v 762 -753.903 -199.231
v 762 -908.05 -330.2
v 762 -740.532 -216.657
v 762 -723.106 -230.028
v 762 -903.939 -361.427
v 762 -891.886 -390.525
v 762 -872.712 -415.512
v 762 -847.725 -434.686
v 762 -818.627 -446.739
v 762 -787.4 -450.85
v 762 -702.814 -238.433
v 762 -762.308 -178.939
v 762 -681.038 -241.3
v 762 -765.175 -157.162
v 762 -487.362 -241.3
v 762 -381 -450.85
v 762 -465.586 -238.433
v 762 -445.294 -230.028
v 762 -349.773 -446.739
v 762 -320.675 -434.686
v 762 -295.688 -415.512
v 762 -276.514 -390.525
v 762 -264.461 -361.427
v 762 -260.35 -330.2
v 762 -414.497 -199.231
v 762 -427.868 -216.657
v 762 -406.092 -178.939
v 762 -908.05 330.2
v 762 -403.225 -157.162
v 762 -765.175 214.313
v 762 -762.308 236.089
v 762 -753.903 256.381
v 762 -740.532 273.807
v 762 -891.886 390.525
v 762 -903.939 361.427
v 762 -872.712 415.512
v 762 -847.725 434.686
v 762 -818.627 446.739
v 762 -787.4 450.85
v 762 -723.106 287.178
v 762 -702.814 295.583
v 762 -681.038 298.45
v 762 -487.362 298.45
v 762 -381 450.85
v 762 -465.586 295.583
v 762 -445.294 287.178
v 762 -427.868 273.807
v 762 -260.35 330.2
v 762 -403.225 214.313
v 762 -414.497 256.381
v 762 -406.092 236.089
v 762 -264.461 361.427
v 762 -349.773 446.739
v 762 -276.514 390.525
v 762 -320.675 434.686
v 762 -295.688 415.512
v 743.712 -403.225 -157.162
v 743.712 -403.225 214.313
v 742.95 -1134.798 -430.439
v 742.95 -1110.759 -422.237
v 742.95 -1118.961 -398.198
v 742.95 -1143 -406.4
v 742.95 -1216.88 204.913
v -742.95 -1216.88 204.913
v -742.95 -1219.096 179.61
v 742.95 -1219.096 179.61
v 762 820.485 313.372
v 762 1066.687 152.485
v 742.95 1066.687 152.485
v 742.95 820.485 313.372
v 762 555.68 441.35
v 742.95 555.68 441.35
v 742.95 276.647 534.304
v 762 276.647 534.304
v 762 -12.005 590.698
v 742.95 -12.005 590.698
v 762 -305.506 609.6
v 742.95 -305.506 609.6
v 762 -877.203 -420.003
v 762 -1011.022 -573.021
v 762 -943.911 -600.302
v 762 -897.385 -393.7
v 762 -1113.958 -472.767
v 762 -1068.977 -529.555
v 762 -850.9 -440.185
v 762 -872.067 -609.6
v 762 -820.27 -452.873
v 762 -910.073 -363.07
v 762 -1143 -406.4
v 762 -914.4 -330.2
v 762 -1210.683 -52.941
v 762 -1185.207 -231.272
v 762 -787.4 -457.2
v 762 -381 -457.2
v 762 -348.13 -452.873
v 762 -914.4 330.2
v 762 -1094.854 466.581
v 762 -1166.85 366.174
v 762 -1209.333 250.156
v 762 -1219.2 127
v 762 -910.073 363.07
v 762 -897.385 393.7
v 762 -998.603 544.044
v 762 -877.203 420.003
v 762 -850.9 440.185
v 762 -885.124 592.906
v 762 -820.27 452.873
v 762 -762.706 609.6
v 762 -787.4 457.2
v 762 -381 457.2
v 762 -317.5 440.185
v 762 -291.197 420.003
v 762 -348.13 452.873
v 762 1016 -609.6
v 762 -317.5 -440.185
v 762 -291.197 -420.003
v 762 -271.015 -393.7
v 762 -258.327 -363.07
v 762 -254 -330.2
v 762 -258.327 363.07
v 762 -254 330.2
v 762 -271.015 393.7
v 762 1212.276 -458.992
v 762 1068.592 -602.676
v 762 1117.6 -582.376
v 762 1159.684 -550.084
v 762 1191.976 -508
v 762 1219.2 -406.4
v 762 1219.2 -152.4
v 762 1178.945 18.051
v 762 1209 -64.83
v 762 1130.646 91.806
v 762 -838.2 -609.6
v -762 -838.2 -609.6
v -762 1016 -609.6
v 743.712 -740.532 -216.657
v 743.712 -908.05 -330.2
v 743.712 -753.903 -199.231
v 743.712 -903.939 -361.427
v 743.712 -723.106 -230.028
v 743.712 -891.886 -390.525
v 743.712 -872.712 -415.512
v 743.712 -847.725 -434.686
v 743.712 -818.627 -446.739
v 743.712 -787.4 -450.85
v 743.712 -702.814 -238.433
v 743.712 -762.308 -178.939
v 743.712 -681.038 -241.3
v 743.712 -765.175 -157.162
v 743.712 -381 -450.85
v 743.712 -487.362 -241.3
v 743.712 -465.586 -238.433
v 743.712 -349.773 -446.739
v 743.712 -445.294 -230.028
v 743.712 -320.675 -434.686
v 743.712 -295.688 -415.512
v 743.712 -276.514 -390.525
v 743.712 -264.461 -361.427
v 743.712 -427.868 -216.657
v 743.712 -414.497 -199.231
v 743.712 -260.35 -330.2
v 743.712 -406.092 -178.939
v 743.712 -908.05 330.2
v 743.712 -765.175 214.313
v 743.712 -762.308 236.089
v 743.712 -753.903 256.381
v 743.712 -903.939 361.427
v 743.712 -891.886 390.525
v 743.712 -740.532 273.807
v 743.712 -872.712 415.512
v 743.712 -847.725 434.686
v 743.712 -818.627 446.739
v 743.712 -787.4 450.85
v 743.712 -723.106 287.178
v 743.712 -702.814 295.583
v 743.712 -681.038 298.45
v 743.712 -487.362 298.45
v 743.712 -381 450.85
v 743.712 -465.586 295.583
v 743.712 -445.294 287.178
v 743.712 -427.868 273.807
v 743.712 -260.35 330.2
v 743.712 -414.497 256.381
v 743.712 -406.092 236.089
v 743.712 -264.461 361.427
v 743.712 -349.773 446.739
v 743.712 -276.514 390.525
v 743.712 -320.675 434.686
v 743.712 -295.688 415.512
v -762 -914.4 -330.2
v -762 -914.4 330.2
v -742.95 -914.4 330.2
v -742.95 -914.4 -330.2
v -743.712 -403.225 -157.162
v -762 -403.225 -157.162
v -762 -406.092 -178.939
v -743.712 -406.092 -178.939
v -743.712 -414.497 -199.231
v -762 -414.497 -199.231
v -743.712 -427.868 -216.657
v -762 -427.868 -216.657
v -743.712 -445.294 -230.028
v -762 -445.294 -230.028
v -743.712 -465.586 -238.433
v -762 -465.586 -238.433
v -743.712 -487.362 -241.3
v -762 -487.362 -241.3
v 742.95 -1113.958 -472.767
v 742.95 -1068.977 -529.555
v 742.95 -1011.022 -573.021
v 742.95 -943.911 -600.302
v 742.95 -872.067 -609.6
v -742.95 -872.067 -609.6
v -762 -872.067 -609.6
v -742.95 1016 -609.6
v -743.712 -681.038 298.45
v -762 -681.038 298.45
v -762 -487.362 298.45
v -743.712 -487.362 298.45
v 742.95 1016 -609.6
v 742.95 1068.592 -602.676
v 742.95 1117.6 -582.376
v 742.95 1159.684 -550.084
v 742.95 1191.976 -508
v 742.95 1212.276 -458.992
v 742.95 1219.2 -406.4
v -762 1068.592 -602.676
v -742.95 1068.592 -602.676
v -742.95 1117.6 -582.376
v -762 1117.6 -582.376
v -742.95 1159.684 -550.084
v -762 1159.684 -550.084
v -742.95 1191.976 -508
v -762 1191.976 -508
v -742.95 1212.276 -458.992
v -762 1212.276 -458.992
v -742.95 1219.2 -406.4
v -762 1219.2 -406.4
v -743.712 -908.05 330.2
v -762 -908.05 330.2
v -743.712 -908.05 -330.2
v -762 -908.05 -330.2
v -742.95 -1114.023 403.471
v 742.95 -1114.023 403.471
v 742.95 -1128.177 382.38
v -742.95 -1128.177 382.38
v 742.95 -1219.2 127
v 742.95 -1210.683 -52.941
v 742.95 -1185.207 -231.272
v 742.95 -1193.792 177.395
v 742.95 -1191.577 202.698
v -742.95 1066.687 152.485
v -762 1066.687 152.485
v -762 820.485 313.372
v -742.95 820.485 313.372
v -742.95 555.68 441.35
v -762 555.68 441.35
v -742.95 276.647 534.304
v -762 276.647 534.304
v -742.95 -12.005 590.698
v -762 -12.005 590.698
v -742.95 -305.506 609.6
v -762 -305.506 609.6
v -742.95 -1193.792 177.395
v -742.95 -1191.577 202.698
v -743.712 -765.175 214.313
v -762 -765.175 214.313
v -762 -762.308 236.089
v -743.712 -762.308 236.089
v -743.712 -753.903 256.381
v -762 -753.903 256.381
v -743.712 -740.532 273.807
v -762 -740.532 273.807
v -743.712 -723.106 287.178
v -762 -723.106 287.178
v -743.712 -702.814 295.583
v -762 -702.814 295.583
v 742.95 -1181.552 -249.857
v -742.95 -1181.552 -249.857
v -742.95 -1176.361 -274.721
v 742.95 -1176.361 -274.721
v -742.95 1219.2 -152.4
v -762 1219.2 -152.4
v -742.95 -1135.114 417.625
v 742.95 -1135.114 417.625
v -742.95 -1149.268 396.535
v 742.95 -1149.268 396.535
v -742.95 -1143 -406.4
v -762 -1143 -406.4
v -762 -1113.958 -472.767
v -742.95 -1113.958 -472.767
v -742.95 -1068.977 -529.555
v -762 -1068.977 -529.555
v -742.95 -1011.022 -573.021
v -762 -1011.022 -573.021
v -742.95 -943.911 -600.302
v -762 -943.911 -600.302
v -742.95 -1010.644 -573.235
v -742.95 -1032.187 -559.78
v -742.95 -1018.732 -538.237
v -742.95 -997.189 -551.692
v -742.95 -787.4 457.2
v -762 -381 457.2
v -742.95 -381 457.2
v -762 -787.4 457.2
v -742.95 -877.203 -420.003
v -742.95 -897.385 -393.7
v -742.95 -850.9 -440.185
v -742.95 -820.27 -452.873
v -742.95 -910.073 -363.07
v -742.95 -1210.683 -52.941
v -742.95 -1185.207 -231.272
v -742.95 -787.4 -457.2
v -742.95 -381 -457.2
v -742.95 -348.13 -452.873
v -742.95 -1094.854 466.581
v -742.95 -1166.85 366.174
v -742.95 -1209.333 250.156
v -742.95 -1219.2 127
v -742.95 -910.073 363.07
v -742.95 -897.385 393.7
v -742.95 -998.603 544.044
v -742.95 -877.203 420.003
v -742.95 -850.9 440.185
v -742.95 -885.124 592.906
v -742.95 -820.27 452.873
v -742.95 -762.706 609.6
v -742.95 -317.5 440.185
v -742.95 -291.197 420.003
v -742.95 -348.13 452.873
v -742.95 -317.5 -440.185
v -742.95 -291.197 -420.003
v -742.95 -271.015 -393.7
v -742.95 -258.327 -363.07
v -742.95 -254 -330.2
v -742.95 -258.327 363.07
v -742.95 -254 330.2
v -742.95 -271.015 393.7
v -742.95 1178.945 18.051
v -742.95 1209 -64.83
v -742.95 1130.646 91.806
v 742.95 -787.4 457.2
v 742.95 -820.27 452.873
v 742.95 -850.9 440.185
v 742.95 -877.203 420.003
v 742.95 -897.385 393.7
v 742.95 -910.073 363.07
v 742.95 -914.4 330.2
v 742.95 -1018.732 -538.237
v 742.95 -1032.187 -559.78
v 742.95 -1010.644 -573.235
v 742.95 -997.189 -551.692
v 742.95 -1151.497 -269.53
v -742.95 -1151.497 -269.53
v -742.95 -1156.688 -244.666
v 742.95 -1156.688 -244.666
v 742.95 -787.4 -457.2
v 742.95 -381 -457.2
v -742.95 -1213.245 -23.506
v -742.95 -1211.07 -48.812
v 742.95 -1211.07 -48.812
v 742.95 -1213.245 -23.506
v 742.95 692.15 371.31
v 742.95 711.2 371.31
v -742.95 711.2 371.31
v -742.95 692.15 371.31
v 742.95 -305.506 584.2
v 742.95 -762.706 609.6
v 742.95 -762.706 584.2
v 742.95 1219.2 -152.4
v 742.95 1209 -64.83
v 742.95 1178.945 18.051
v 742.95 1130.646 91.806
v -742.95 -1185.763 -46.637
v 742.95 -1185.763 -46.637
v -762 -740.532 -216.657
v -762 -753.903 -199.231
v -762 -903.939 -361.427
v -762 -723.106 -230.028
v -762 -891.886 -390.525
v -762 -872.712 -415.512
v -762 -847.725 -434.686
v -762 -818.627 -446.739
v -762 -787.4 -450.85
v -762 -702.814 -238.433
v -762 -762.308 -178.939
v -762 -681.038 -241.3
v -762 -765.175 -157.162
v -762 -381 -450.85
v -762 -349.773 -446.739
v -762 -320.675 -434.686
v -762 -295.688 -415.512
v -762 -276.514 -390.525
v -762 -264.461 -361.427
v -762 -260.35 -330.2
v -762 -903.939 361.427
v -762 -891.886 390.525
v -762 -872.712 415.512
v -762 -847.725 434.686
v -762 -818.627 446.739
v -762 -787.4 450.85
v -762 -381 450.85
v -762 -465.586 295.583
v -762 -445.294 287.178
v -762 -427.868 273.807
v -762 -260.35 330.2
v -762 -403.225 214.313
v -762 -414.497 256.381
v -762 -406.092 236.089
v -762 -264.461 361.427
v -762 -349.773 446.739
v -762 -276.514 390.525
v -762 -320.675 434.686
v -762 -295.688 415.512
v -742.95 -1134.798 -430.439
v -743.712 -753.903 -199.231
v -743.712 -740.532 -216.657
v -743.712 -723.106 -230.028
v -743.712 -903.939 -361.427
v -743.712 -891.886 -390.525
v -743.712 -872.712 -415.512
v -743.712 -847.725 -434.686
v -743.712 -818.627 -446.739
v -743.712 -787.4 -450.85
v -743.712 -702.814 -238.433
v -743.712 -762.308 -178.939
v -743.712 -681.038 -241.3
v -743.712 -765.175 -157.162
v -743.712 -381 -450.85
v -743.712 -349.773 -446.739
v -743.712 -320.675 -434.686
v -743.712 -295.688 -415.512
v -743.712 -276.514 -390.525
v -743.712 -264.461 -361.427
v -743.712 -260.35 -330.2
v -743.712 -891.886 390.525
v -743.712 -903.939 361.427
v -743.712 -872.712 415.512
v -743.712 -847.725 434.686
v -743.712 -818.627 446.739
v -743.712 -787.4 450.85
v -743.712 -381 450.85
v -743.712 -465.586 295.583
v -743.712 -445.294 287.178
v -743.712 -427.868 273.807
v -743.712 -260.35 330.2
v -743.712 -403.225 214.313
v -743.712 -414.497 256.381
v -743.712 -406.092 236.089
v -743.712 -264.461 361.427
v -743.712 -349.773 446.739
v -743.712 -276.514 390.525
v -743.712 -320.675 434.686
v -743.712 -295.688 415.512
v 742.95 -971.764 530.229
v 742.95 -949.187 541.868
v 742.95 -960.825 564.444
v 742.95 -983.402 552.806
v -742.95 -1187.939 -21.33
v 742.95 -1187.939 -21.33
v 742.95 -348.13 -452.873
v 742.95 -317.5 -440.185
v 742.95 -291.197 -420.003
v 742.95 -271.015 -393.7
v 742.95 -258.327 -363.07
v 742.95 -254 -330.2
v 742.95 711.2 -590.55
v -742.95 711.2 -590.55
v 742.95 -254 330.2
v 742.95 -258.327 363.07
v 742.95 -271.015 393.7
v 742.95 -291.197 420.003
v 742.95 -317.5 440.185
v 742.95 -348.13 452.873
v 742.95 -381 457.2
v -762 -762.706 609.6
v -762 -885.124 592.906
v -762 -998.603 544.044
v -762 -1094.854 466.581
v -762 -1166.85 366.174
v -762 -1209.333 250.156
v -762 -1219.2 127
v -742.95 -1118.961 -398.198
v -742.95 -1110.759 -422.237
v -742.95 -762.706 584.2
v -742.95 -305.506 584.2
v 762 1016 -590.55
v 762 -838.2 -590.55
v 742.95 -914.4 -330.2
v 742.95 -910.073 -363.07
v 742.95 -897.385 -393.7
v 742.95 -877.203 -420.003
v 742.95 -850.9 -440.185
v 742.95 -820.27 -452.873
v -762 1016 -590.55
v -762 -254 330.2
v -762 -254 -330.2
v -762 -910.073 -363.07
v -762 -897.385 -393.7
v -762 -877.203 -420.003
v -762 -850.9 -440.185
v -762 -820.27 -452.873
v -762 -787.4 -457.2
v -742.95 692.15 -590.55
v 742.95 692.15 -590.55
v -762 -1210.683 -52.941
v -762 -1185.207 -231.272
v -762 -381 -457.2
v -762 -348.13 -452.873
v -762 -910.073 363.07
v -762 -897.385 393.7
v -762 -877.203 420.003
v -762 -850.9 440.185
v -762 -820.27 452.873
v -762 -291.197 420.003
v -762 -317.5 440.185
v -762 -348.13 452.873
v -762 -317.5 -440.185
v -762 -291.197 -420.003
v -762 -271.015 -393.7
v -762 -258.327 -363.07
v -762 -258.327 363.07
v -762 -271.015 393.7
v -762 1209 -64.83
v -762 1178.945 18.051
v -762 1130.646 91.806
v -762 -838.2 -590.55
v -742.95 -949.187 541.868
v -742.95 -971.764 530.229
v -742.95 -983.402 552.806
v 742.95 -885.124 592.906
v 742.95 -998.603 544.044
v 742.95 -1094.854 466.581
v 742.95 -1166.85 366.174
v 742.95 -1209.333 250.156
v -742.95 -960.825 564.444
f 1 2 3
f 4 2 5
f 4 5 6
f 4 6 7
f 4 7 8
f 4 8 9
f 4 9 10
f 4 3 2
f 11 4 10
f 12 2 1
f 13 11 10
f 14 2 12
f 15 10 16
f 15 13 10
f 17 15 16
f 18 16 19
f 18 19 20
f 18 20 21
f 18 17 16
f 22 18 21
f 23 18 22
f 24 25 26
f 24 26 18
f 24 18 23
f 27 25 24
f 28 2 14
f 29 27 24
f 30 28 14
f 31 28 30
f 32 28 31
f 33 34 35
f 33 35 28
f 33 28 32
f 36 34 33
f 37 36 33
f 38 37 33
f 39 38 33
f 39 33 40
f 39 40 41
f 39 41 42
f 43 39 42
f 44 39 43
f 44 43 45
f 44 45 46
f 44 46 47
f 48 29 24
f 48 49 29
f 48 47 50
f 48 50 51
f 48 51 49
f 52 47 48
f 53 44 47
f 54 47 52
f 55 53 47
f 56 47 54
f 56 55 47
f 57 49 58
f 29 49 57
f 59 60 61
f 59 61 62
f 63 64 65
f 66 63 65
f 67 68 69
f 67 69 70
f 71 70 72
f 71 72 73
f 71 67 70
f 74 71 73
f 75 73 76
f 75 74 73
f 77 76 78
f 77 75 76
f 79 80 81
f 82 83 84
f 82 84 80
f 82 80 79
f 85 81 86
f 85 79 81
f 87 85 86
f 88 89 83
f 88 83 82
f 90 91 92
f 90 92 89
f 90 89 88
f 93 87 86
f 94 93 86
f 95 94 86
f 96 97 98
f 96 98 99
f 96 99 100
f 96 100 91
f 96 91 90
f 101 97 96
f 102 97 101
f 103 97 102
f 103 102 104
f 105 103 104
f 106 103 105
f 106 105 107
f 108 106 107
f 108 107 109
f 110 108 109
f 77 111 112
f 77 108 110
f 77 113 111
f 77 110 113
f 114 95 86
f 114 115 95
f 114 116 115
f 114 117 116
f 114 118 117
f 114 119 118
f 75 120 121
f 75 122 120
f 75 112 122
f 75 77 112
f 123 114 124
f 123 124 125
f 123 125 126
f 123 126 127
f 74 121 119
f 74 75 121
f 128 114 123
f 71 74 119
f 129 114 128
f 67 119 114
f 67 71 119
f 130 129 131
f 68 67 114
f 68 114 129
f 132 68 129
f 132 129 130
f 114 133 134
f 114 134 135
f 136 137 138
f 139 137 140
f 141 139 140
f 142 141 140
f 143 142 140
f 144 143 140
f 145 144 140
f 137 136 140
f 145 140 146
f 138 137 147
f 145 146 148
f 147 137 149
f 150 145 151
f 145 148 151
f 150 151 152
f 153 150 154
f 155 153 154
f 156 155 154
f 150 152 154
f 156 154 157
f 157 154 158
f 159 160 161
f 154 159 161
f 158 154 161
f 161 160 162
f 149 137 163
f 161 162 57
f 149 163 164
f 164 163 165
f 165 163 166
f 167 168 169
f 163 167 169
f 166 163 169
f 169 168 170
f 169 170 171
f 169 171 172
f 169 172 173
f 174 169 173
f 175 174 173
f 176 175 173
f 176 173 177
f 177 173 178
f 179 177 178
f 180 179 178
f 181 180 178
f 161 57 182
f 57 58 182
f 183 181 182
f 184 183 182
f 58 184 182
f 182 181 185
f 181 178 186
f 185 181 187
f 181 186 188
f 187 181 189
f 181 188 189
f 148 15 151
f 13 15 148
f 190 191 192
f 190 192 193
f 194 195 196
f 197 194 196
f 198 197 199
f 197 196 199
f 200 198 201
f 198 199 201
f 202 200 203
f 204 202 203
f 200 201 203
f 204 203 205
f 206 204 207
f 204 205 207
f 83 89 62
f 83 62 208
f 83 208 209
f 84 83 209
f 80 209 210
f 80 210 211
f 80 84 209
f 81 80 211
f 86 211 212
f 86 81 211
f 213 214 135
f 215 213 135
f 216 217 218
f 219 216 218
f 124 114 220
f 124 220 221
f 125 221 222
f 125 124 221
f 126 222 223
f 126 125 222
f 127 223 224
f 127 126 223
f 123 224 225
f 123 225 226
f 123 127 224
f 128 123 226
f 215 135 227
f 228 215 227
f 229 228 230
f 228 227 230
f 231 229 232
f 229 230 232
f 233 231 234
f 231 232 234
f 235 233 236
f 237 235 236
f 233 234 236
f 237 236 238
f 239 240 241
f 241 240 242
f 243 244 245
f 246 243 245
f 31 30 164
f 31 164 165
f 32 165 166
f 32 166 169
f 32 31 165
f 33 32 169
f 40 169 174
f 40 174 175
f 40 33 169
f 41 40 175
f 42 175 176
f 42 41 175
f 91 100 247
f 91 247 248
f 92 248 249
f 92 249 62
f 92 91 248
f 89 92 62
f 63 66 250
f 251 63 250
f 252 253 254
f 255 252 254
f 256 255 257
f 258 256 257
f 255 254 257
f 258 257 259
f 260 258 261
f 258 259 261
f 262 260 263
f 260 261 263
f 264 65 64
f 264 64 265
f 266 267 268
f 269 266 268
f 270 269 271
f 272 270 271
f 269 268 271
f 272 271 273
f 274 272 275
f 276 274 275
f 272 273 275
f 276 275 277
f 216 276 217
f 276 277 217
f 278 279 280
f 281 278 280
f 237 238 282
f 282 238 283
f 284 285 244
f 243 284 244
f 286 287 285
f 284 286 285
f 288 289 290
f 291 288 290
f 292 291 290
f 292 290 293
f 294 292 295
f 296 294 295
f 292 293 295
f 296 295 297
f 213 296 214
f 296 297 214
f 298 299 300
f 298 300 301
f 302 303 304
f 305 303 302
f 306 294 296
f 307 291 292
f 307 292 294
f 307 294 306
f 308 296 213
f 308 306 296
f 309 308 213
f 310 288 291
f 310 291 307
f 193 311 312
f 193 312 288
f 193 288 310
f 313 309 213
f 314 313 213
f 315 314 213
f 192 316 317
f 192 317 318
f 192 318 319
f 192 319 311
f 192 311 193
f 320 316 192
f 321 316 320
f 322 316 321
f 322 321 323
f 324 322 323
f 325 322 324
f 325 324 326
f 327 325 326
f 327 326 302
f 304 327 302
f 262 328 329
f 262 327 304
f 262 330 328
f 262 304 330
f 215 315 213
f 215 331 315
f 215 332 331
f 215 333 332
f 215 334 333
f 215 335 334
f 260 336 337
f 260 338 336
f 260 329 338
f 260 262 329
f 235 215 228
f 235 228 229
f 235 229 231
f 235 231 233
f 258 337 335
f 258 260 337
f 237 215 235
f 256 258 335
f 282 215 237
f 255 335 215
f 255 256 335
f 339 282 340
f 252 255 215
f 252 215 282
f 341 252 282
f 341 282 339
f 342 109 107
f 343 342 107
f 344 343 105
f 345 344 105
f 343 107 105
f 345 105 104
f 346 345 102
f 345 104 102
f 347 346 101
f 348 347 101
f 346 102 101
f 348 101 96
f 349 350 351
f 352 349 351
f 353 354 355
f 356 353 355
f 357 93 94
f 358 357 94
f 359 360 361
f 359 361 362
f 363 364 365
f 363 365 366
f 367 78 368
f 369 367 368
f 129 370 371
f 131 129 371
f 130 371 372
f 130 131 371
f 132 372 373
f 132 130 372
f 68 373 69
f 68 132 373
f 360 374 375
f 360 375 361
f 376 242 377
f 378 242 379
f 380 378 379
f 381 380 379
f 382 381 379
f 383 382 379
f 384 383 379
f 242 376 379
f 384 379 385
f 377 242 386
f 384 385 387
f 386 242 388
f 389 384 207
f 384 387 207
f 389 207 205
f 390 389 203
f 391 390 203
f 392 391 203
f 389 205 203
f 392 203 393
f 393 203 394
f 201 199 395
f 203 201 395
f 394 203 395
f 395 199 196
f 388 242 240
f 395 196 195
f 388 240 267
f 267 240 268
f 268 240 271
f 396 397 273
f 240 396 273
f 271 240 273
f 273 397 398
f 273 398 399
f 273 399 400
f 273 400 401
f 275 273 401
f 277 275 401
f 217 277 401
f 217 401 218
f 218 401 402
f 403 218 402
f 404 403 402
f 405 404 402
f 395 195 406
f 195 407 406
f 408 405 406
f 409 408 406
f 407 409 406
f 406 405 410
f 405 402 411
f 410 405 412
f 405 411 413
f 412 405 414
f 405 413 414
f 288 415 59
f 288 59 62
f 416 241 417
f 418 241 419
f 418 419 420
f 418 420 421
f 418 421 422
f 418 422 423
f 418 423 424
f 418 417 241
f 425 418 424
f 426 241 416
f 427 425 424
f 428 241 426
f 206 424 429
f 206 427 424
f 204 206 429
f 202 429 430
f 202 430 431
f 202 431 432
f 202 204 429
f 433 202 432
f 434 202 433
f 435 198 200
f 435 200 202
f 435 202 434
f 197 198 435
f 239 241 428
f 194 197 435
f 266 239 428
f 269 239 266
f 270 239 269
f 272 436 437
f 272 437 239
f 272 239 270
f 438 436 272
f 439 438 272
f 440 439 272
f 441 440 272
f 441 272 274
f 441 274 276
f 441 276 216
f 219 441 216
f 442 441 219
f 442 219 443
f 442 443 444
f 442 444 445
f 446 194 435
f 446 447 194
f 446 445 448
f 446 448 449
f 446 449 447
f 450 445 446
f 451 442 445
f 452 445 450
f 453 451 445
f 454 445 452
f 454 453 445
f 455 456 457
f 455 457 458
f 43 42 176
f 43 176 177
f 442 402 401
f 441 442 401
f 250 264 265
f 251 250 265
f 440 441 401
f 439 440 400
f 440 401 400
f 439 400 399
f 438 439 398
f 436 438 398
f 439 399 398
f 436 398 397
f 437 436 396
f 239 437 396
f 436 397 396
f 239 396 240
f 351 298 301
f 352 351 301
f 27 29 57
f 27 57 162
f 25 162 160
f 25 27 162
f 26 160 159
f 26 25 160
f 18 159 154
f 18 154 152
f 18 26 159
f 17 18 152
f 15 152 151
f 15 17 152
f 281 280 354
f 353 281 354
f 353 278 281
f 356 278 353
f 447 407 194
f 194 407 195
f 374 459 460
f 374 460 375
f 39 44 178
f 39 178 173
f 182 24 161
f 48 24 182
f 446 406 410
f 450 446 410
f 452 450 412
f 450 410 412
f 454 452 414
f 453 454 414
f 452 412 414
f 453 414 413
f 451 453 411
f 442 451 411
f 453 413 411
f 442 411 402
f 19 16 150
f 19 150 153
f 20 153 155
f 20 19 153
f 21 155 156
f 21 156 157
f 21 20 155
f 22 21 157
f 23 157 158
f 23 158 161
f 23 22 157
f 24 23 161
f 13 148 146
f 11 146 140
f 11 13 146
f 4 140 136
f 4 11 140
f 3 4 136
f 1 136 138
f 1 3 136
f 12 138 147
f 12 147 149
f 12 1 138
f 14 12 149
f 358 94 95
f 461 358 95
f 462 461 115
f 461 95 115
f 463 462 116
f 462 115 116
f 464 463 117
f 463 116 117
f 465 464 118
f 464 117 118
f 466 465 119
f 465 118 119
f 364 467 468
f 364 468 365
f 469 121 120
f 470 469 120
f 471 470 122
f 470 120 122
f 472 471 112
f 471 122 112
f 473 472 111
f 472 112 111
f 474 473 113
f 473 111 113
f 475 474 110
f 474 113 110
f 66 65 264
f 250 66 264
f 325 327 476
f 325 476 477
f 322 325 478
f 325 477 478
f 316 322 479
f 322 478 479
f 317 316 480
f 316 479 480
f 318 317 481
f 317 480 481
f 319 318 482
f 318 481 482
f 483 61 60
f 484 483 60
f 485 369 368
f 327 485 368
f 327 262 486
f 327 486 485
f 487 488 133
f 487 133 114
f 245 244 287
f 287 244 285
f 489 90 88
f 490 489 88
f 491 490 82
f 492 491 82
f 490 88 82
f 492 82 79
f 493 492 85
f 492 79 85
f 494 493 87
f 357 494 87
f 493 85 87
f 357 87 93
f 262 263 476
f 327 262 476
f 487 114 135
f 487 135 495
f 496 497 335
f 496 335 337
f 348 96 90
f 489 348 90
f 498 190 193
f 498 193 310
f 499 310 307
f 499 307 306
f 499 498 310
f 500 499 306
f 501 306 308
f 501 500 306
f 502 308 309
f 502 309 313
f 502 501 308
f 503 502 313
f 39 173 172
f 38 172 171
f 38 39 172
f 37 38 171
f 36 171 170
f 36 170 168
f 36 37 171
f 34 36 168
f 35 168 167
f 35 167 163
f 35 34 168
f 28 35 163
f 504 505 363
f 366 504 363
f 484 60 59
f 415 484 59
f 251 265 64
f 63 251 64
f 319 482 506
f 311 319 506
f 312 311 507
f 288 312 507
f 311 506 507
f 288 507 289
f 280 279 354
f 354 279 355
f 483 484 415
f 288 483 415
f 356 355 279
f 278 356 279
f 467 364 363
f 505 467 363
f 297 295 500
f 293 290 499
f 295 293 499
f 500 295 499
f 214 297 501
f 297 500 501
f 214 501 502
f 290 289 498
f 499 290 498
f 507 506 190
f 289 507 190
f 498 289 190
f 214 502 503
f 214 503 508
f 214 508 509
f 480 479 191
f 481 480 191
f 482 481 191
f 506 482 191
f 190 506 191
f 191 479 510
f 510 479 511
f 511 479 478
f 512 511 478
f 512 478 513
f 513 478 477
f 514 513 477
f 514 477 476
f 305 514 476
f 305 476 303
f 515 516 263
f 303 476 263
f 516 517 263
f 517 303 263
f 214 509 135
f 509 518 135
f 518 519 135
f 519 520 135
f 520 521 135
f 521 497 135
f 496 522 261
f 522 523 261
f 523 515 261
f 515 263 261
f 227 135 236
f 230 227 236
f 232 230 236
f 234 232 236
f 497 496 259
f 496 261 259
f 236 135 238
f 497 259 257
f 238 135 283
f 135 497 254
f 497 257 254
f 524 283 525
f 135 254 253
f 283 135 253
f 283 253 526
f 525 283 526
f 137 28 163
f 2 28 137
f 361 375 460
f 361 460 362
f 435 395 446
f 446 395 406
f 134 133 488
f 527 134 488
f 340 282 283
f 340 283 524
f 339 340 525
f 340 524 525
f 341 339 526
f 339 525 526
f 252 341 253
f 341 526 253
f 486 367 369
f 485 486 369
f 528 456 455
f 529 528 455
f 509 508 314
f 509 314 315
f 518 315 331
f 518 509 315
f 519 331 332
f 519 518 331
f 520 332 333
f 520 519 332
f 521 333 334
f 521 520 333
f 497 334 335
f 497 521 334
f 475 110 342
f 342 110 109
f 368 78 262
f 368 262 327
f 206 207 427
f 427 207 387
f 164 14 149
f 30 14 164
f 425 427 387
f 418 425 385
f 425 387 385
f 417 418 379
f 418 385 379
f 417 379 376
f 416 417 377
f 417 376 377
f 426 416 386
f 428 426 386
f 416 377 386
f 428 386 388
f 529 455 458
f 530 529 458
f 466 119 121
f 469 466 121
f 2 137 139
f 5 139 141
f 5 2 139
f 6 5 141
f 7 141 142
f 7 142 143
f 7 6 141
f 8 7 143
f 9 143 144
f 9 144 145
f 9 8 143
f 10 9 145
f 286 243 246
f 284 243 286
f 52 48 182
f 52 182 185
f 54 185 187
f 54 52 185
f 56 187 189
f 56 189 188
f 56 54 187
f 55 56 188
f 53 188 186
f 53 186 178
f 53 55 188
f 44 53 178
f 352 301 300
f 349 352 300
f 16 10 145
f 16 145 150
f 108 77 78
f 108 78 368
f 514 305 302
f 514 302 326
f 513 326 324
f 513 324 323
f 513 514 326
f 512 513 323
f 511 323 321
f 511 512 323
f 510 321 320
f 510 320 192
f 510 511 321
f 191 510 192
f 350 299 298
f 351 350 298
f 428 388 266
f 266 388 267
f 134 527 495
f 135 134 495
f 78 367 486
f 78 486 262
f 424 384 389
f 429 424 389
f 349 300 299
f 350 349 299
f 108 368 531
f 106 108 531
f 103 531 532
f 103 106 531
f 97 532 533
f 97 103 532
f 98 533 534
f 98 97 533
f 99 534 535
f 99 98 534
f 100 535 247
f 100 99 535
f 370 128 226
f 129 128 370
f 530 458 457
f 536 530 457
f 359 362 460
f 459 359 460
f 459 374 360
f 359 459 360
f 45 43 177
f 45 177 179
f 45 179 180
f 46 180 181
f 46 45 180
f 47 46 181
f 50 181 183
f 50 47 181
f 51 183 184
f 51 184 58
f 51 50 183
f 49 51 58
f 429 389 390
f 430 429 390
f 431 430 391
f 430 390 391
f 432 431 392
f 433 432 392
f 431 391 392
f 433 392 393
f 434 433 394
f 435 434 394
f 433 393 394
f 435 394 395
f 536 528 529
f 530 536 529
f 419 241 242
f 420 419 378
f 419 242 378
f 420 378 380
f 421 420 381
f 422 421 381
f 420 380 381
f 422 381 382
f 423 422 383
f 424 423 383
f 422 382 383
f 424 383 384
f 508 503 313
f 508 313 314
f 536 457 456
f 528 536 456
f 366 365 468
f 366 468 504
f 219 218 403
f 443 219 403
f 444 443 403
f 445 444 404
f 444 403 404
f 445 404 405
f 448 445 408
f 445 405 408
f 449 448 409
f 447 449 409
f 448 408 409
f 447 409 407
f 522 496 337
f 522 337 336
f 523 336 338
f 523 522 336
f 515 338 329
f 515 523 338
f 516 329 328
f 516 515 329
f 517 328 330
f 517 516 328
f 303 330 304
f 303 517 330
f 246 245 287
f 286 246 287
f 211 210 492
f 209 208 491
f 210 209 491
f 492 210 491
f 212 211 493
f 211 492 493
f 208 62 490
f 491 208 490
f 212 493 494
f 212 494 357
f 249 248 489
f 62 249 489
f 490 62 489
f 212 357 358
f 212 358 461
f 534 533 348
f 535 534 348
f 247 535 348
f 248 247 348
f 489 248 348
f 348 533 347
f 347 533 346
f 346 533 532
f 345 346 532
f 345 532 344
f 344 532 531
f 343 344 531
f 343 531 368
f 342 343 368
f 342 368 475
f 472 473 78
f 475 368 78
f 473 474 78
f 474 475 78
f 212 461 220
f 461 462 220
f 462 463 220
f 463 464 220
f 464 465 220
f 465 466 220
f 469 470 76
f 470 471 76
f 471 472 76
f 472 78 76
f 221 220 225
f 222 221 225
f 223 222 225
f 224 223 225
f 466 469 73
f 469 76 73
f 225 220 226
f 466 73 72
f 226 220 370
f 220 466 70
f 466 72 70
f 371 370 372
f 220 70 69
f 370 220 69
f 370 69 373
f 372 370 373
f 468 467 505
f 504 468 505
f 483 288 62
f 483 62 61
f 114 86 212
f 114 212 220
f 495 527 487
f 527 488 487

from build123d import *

# Parameters (mm, degrees)
F3_DEPTH       = 19.05
F5_DEPTH       = 25.4
F7_DEPTH       = 18.288
F9_W           = 1854.2
F9_H           = 19.05
F10_DEPTH      = 762
F10_DEPTH_BACK = 762
F11_W          = 457.2
F11_H          = 25.4
F12_DEPTH      = 1485.9
F14_DEPTH      = 1485.9
F16_DEPTH      = 1485.9
F18_DEPTH      = 1485.9
F21_DEPTH      = 1485.9
F23_DEPTH      = 1485.9
F25_DEPTH      = 1485.9
F27_DEPTH      = 1485.9
F28_W          = 19.05
F28_H          = 961.8595884721
F29_DEPTH      = 1485.9


with BuildPart() as f3:
    # F2 (on offset) → F3 (new body)
    with BuildSketch(Plane.YZ.offset(762)):
        with BuildLine():
            Line((-872.0666666667, -609.6), (1016, -609.6))
            ThreePointArc((1016, -609.6), (1159.6840979371, -550.0840979371), (1219.2, -406.4))
            Line((1219.2, -406.4), (1219.2, -152.4))
            ThreePointArc((1219.2, -152.4), (1178.9451936847, 18.0514974437), (1066.687070967, 152.484664096))
            ThreePointArc((1066.687070967, 152.484664096), (417.658564221, 492.3152671112), (-305.5061008075, 609.6))
            Line((-305.5061008075, 609.6), (-762.7061008075, 609.6))
            ThreePointArc((-762.7061008075, 609.6), (-1094.8542003053, 466.5806486721), (-1219.2, 127))
            ThreePointArc((-1219.2, 127), (-1200.0537854245, -142.4076836321), (-1143, -406.4))
            ThreePointArc((-1143, -406.4), (-1041.4, -553.1555555556), (-872.0666666667, -609.6))
        make_face()
    extrude(amount=-F3_DEPTH)

    # F4 (on face) → F5 (cut)
    with BuildSketch(Plane.YZ.offset(762)):
        with BuildLine():
            Line((-381, 457.2), (-787.4, 457.2))
            ThreePointArc((-787.4, 457.2), (-877.2025612107, 420.0025612107), (-914.4, 330.2))
            Line((-914.4, 330.2), (-914.4, -330.2))
            ThreePointArc((-914.4, -330.2), (-877.2025612107, -420.0025612107), (-787.4, -457.2))
            Line((-787.4, -457.2), (-381, -457.2))
            ThreePointArc((-381, -457.2), (-291.1974387893, -420.0025612107), (-254, -330.2))
            Line((-254, -330.2), (-254, 330.2))
            ThreePointArc((-254, 330.2), (-291.1974387893, 420.0025612107), (-381, 457.2))
        make_face()
    extrude(amount=-F5_DEPTH, mode=Mode.SUBTRACT)


with BuildPart() as f7:
    # F6 (on face) → F7 (new body)
    with BuildSketch(Plane.YZ.offset(762)):
        with BuildLine():
            Line((-260.3499808311, -330.2), (-260.3499808311, 330.2))
            ThreePointArc((-260.3499808311, 330.2), (-295.6875532954, 415.5124467046), (-381, 450.8500191689))
            Line((-381, 450.8500191689), (-787.4, 450.8500191689))
            ThreePointArc((-787.4, 450.8500191689), (-872.7124467046, 415.5124467046), (-908.0500191689, 330.2))
            Line((-908.0500191689, 330.2), (-908.0500191689, -330.2))
            ThreePointArc((-908.0500191689, -330.2), (-872.7124467046, -415.5124467046), (-787.4, -450.8500191689))
            Line((-787.4, -450.8500191689), (-381, -450.8500191689))
            ThreePointArc((-381, -450.8500191689), (-295.6875532954, -415.5124467046), (-260.3499808311, -330.2))
        make_face()
        with BuildLine():
            ThreePointArc((-403.225, -157.1624808311), (-427.8683031979, -216.6566776332), (-487.3625, -241.2999808311))
            Line((-487.3625, -241.2999808311), (-681.0375, -241.2999808311))
            ThreePointArc((-681.0375, -241.2999808311), (-740.5316968021, -216.6566776332), (-765.175, -157.1624808311))
            Line((-765.175, -157.1624808311), (-765.175, 214.3125191689))
            ThreePointArc((-765.175, 214.3125191689), (-740.5316968021, 273.8067159709), (-681.0375, 298.4500191689))
            Line((-681.0375, 298.4500191689), (-487.3625, 298.4500191689))
            ThreePointArc((-487.3625, 298.4500191689), (-427.8683031979, 273.8067159709), (-403.225, 214.3125191689))
            Line((-403.225, 214.3125191689), (-403.225, -157.1624808311))
        make_face(mode=Mode.SUBTRACT)
    extrude(amount=-F7_DEPTH)


with BuildPart() as f8_1:
    # F8: instance of F7
    add(f7.part.mirror(Plane.YZ))


with BuildPart() as f8_2:
    # F8: instance of F3
    add(f3.part.mirror(Plane.YZ))


with BuildPart() as f10:
    # F9 (on Right) → F10 (new body, two sides)
    with BuildSketch(Plane.YZ) as f10_sk:
        with Locations((88.9, -600.075)):
            Rectangle(F9_W, F9_H)
    extrude(amount=F10_DEPTH)
    extrude(f10_sk.sketch, amount=-F10_DEPTH_BACK)


with BuildPart() as f12:
    # F11 (on face) → F12 (new body, through all)
    with BuildSketch(Plane(origin=(742.95, 0, 0), x_dir=(0, -1, 0), z_dir=(-1, 0, 0))):
        with Locations((534.1061008075, 596.9)):
            Rectangle(F11_W, F11_H)
    extrude(amount=F12_DEPTH)


with BuildPart() as f14:
    # F13 (on face) → F14 (new body, through all)
    with BuildSketch(Plane(origin=(742.95, 0, 0), x_dir=(0, -1, 0), z_dir=(-1, 0, 0))):
        Polygon((971.7638361801, 530.2294133145), (983.402082032, 552.8061985926), (960.8252967539, 564.4444444444), (949.187050902, 541.8676591664), align=None)
    extrude(amount=F14_DEPTH)


with BuildPart() as f16:
    # F15 (on face) → F16 (new body, through all)
    with BuildSketch(Plane(origin=(742.95, 0, 0), x_dir=(0, -1, 0), z_dir=(-1, 0, 0))):
        Polygon((1149.2679507058, 396.5347500934), (1135.113596634, 417.6253703027), (1114.0229764248, 403.4710162309), (1128.1773304966, 382.3803960216), align=None)
    extrude(amount=F16_DEPTH)


with BuildPart() as f18:
    # F17 (on face) → F18 (new body, through all)
    with BuildSketch(Plane.YZ.offset(-742.95)):
        Polygon((-1216.8802982613, 204.9132208801), (-1219.0956875563, 179.6100185082), (-1193.7924851845, 177.3946292132), (-1191.5770958894, 202.697831585), align=None)
    extrude(amount=F18_DEPTH)


with BuildPart() as f21:
    # F20 (on face) → F21 (new body, through all)
    with BuildSketch(Plane(origin=(742.95, 0, 0), x_dir=(0, -1, 0), z_dir=(-1, 0, 0))):
        Polygon((1213.2452920093, -23.5057437357), (1187.9386290905, -21.3302410547), (1185.7631264095, -46.6369039735), (1211.0697893283, -48.8124066545), align=None)
    extrude(amount=F21_DEPTH)


with BuildPart() as f23:
    # F22 (on face) → F23 (new body, through all)
    with BuildSketch(Plane.YZ.offset(-742.95)):
        Polygon((-1156.6880989045, -244.6664041214), (-1181.5520748702, -249.8570398412), (-1176.3614391505, -274.7210158069), (-1151.4974631848, -269.5303800872), align=None)
    extrude(amount=F23_DEPTH)


with BuildPart() as f25:
    # F24 (on face) → F25 (new body, through all)
    with BuildSketch(Plane(origin=(742.95, 0, 0), x_dir=(0, -1, 0), z_dir=(-1, 0, 0))):
        Polygon((1143, -406.4), (1118.9607413114, -398.1979245492), (1110.7586658605, -422.2371832378), (1134.7979245492, -430.4392586886), align=None)
    extrude(amount=F25_DEPTH)


with BuildPart() as f27:
    # F26 (on face) → F27 (new body, through all)
    with BuildSketch(Plane.YZ.offset(-742.95)):
        Polygon((-1018.7321338238, -538.2365409985), (-1032.1871497474, -559.7800445784), (-1010.6436461675, -573.2350605019), (-997.1886302439, -551.691556922), align=None)
    extrude(amount=F27_DEPTH)


with BuildPart() as f29:
    # F28 (on face) → F29 (new body, through all)
    with BuildSketch(Plane(origin=(742.95, 0, 0), x_dir=(0, -1, 0), z_dir=(-1, 0, 0))):
        with Locations((-701.675, -109.6202057639)):
            Rectangle(F28_W, F28_H)
    extrude(amount=F29_DEPTH)


solid = Compound([f3.part, f7.part, f8_1.part, f8_2.part, f10.part, f12.part, f14.part, f16.part, f18.part, f21.part, f23.part, f25.part, f27.part, f29.part])
